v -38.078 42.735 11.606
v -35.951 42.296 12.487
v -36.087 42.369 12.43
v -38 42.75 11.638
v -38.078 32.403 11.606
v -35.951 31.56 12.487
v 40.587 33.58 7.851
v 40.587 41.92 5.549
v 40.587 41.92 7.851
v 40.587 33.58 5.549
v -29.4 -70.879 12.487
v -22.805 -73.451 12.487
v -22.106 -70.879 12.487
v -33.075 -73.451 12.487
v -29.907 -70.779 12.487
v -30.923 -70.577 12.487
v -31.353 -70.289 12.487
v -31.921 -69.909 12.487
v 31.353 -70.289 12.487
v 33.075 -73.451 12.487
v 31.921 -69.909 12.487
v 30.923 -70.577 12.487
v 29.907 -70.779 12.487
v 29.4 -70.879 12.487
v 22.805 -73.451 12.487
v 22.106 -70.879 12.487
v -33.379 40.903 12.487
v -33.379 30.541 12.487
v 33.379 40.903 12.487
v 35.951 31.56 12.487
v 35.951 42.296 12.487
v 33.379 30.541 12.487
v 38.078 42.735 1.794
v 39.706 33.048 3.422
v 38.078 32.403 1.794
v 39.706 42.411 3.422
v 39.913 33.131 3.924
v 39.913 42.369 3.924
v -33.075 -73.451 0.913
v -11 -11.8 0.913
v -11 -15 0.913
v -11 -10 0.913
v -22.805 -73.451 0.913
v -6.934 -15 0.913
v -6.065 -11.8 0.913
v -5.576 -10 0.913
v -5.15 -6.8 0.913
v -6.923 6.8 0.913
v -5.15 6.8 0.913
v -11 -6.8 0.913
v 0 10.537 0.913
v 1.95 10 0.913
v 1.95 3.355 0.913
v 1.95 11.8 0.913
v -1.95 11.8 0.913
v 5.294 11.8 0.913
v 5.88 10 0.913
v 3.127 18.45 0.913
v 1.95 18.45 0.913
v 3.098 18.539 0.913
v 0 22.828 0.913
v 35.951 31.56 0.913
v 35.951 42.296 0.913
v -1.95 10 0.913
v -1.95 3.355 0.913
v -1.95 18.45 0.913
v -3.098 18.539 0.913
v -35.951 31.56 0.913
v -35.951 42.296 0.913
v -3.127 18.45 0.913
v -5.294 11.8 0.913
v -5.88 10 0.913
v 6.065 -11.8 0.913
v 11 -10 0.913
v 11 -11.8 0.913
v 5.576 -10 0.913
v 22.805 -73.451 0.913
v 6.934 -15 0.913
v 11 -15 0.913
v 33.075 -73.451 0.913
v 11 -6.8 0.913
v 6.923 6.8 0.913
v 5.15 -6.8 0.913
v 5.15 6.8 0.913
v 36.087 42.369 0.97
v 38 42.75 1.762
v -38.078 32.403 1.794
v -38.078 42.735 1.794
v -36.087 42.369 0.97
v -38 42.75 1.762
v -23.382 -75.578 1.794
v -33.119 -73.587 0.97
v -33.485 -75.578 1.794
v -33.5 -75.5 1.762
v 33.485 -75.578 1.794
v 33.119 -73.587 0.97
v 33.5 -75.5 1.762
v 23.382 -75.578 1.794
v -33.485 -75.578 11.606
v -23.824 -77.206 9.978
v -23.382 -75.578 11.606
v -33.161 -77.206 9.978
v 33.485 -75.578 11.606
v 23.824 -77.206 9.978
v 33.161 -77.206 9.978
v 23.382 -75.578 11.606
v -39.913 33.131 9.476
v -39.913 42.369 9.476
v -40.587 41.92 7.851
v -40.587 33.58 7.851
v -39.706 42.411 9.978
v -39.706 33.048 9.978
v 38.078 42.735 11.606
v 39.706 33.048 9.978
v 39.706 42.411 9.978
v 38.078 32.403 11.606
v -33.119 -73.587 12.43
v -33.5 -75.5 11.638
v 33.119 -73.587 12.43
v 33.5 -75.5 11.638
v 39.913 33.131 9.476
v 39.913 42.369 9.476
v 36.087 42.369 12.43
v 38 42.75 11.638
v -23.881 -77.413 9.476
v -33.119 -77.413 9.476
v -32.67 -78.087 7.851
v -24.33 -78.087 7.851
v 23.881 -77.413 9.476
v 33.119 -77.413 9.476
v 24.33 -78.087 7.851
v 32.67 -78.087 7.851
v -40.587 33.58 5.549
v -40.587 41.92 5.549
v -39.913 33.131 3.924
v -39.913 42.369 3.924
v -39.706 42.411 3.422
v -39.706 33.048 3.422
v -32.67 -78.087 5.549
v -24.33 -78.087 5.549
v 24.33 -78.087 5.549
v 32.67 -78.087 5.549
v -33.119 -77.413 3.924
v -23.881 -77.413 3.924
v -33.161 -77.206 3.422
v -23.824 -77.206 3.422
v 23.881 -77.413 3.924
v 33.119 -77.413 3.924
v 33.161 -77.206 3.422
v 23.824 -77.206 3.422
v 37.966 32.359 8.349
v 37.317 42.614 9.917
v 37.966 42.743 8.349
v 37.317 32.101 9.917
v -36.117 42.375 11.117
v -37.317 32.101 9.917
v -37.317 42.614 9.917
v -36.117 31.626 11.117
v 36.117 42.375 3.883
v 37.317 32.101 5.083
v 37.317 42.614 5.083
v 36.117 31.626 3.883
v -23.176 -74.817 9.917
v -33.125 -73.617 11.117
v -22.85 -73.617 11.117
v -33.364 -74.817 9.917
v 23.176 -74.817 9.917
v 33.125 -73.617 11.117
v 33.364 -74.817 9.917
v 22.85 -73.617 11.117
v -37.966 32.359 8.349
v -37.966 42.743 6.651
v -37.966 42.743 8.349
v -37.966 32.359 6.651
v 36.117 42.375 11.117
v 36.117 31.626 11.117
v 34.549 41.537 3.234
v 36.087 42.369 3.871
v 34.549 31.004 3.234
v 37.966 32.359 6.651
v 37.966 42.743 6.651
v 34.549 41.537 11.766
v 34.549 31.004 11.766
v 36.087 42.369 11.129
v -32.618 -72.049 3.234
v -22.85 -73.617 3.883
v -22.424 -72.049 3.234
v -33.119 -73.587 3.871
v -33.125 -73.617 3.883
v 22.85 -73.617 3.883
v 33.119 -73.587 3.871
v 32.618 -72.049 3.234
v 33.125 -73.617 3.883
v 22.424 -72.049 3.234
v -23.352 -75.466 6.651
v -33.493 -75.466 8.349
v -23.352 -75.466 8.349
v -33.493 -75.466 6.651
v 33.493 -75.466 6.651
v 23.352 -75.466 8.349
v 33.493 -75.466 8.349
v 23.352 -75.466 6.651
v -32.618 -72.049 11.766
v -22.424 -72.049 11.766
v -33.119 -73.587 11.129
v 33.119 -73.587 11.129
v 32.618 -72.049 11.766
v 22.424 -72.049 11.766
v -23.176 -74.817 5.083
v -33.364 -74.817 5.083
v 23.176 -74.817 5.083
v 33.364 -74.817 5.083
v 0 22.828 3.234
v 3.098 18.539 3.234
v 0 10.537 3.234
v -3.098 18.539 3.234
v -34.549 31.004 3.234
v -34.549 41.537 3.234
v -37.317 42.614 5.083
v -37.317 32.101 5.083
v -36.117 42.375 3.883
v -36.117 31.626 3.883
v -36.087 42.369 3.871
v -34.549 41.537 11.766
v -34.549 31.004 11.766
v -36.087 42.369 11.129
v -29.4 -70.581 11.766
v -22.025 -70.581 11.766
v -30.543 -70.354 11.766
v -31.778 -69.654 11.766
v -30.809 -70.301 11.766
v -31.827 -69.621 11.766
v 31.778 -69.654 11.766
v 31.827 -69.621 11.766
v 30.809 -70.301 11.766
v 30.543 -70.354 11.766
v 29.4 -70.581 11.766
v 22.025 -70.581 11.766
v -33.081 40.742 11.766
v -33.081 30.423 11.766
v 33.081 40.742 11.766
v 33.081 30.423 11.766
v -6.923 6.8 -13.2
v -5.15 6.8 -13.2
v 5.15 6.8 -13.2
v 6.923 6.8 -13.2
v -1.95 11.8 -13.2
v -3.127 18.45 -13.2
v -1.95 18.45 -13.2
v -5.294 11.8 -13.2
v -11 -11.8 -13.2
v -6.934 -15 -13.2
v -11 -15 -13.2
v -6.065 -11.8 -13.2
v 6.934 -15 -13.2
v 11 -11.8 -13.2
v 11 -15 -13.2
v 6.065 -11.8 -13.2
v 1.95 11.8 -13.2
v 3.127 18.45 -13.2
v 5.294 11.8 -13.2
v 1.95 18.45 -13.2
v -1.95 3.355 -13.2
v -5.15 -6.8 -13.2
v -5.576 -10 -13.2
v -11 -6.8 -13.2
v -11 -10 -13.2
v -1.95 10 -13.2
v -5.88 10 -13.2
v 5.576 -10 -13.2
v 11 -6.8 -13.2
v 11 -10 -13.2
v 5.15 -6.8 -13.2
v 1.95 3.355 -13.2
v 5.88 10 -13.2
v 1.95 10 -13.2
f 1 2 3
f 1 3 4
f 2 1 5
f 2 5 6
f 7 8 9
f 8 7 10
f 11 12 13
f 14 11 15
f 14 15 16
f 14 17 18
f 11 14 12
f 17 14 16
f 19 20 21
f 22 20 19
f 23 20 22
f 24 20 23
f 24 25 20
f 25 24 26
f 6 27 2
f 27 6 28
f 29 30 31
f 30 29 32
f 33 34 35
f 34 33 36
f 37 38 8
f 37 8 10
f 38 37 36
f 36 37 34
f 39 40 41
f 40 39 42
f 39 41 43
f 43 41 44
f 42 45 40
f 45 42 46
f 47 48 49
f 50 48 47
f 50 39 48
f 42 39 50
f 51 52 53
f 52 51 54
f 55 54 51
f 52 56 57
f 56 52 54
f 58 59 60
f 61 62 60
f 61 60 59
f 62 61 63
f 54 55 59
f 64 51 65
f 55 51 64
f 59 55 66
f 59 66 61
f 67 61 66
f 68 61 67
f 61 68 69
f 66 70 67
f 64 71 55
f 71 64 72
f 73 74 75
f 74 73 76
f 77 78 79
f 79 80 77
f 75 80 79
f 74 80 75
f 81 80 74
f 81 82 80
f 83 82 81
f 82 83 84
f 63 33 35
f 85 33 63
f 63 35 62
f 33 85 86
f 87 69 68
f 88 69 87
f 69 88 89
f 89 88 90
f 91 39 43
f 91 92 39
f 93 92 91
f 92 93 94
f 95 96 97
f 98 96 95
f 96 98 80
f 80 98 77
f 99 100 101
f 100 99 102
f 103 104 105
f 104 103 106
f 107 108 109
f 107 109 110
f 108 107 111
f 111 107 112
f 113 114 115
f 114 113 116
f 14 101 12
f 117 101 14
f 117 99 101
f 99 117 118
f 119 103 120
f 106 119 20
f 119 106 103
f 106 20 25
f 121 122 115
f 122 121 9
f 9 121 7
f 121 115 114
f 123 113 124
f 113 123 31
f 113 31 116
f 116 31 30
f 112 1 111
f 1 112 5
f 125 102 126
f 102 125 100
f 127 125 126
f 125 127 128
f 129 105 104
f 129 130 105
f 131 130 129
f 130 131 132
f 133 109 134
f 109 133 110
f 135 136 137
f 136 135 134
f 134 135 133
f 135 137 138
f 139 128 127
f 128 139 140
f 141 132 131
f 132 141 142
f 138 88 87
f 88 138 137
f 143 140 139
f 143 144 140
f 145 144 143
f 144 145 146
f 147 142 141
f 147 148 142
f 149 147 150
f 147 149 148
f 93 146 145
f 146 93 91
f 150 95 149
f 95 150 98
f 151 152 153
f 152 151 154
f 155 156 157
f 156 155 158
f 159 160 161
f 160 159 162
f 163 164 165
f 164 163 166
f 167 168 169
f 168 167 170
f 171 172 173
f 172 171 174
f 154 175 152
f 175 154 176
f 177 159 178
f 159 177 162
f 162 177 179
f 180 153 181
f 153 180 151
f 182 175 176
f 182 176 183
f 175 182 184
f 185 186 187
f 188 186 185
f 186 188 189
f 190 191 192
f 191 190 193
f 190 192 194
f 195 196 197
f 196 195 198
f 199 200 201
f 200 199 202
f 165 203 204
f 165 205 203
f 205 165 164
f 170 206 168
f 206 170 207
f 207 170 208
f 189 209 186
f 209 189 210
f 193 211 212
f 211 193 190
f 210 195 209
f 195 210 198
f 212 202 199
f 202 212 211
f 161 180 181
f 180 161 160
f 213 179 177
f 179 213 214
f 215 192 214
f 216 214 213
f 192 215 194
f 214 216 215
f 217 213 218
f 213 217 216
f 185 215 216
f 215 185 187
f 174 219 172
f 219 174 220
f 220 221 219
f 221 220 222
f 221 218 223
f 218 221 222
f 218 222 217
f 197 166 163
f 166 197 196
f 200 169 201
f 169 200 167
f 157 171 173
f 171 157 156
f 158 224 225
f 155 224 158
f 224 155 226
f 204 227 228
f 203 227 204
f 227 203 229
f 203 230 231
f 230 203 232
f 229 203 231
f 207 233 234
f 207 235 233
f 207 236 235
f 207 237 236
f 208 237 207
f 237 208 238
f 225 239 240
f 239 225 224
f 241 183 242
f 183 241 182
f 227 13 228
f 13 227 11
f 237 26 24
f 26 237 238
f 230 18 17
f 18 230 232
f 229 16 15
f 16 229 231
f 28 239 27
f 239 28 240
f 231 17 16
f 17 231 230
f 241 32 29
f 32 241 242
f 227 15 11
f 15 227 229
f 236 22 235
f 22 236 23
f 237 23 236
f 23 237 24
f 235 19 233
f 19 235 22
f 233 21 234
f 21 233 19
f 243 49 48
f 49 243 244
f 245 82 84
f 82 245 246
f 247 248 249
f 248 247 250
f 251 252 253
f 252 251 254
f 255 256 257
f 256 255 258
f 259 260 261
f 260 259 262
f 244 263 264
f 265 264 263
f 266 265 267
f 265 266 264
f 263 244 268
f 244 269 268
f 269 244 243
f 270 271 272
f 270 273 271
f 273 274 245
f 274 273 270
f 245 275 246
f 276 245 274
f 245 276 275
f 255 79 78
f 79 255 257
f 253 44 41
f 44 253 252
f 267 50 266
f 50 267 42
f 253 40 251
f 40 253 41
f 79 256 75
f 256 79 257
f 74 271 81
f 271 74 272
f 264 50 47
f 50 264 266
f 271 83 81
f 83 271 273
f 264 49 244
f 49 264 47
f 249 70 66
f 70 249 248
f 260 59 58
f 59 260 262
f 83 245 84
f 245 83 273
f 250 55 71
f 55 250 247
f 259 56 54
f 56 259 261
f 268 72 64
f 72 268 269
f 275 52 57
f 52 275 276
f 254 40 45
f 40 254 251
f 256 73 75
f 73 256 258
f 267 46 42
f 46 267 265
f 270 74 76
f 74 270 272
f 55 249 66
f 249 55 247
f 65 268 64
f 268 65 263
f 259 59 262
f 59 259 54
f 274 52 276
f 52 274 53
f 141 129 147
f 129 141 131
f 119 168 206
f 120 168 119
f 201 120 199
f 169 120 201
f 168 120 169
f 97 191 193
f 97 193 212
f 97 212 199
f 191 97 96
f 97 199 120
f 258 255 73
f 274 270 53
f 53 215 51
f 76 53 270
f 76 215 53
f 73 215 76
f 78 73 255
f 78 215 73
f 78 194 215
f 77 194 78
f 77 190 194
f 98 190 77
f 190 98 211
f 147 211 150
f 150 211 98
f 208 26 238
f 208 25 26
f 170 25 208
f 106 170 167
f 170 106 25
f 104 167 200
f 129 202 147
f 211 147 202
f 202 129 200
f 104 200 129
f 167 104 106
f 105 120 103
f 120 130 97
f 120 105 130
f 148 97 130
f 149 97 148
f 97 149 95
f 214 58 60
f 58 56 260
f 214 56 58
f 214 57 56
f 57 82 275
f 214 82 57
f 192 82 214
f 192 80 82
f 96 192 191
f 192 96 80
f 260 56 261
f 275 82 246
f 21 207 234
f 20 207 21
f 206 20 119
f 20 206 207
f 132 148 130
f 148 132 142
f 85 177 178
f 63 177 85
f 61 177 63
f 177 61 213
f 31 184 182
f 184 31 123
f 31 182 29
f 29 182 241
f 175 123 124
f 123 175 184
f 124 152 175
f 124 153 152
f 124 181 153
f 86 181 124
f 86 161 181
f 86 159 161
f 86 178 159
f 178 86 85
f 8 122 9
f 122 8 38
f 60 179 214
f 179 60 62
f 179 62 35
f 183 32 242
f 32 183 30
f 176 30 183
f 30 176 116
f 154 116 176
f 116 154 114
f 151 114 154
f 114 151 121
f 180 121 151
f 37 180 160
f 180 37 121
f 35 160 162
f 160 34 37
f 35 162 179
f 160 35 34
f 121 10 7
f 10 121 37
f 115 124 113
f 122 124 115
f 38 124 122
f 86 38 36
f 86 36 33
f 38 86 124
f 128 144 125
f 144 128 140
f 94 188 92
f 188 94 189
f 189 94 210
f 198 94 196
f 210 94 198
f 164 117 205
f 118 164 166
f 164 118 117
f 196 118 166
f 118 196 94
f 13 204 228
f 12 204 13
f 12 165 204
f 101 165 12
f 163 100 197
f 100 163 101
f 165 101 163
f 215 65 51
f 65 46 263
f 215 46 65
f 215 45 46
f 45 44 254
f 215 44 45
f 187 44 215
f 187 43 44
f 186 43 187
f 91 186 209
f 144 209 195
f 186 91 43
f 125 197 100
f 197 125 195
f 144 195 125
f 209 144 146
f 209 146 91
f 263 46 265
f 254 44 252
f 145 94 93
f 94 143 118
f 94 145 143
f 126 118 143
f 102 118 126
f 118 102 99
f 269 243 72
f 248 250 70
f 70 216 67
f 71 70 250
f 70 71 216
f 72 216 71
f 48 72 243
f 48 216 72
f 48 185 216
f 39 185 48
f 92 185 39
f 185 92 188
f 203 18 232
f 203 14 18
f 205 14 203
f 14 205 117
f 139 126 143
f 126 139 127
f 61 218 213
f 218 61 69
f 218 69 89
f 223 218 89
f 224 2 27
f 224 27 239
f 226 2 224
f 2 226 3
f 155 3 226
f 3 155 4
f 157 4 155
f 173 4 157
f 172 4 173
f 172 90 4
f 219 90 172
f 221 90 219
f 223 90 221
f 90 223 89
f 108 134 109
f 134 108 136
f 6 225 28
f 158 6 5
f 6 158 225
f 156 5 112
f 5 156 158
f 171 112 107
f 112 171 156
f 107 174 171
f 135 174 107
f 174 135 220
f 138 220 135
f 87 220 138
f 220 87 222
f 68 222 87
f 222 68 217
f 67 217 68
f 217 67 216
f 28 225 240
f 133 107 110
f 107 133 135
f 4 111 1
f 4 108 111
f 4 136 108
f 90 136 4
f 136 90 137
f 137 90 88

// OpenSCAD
// file: syms.scad
module symY(t) {
    translate(t)
        children();
    mirror([0,1,0])
        translate(t)
            children();
}
module symX(t) {
    translate(t)
        children();
    mirror([1,0,0])
        translate(t)
            children();
}

module symZ(t) {
    translate(t)
        children();
    mirror([0,0,1])
        translate(t)
            children();
}

module	symXY(t) {
	tx=t[0];
	ty=t[1];
	tz=t[2];
	symX([tx,0,0])
	symY([0,ty,tz])
		children();
}
// main file
include <syms.scad>

render=false;
$fn=render ? 64 : 16;

W=1.6;

V_C_D=3.9; // ~3.6?
V_S_D=3;

H_C_D=1.8;
H_S_D=H_C_D; // unmeasured?

H_SPACE=15;
V_SPACE=20;
DEPTH=15;    // max: 32?

SPHERE_D=100;

Y=V_SPACE+(H_C_D+H_S_D)/2;
Y2=Y/2+H_SPACE/2;
X=H_SPACE/2+(V_C_D+V_S_D)/2;

SP=.2;
SP3=[SP,SP,SP];
SLOT=[X*2+2*W,Y2*2+2*W,W];

PHONE=[76,151,8.6];


module roundedBlock(dim=[10,10,2],zPos=0) {
    hull()
    symXY([dim[0]/2,dim[1]/2,zPos]){
        sphere(d=dim[2]);
    }
}


module cx(e,f){
    translate([0,0,-DEPTH/2])
    cube([e,.1+f,DEPTH+f],center=true);
}


module h1(e=0,f=0) {

    
/*    // H_CENTER
    hull()
    symX([X,0,0])
    rotate(90)
    cx(H_C_D+e,f);
*/
    // H_TOP/BOT
    symY([0,Y/2,0])
    hull()
    symX([X,0,0])
    rotate(90)
    cx(H_S_D+e,f);

    // V
    hull()
    symY([0,Y2,0]) {
        cx(V_C_D+e,f);
    }

    
/* 
    symX([H_SPACE+(V_C_D+V_S_D)/2,0,0])
    hull()
    symY([0,V_SPACE+(H_C_D+H_S_D)/2,0]) {
        cube(V_C_D,center=true);
    }
    */
}



module mod0(multipart=true) {
    if(multipart) {
        cube(SLOT,center=true);
    }
    r=SPHERE_D/2;
    SPHERE_Z=DEPTH+sqrt(r*r-Y2*Y2);
    difference() {
        h1(W*4,0);
        h1(0,1);
//        translate([0,0,-SPHERE_Z])
  //      sphere($fn=64,d=SPHERE_D);
    }
}

function const3(val)=[val,val,val];

module holderPart0(multipart=true) {
    H_ADJ=W;
    difference() {
        union() {
            translate([0,0,PHONE[2]/2+W/2+H_ADJ])
            roundedBlock(PHONE+[-W*4,-W*4,2*W]);
//            cube(PHONE,center=true);
            if(multipart)
            translate([0,W,0])
            cube(SLOT+[2*W,0,2*W],center=true);
        }
        translate([0,0,-SLOT[2]/2]){
            color([1,0,0])
            cube(SLOT+2*SP3,center=true);
            color([0,1,0])
            translate([0,0,-W])
            cube(SLOT-[W,W,0],center=true);
        }
        
            translate([0,0,PHONE[2]/2+W+H_ADJ])
            roundedBlock(PHONE-[PHONE[2],PHONE[2],-.1]);
            translate([0,0,PHONE[2]/2+W+W+W+W+W+H_ADJ])
            roundedBlock(PHONE-[PHONE[2],PHONE[2],0]*2);
    }
}


module holderPart(multipart=true) {
    module d1(X0Y0,C0) {
                    hull() {
                        $fn=16;
                        translate(X0Y0) 
                        cylinder(d=10,h=35,center=true);
                        translate(C0) 
                        cylinder(d=5,h=35,center=true);
                    }
    }

    intersection() {
        union() {
            holderPart0(multipart);
            if(!multipart) {
                translate([0,0,W+SP])
                mod0();
            }
        }
        
        union() {
        translate([0,0,SLOT[2]])
            symX([0,0,0]) {
                C0=[0,SLOT[1]/2,0];
                X0Y0=[PHONE[0]/2,-PHONE[1]/2,0];
                X1Y0=[PHONE[0]/2*3/4,-PHONE[1]/2,0];
                X0Y1=[PHONE[0]/2,-PHONE[1]/4,0];
                X0Y2=[PHONE[0]/2,PHONE[1]/2/2,0];
//                d1(X0Y0,C0);
                d1(X1Y0,C0);
//                d1(X0Y1,C0);
                d1(X0Y2,C0);
            }
        }
    }
}

mode="allinone";

if(mode == "preview" ){
    holderPart();
    translate([0,0,-10])
    mod0();
}
if(mode == "ventPart" ){
    rotate(90,[0,1,0])
    mod0();
}


if(mode == "allinone" ){
    holderPart(false);
}
